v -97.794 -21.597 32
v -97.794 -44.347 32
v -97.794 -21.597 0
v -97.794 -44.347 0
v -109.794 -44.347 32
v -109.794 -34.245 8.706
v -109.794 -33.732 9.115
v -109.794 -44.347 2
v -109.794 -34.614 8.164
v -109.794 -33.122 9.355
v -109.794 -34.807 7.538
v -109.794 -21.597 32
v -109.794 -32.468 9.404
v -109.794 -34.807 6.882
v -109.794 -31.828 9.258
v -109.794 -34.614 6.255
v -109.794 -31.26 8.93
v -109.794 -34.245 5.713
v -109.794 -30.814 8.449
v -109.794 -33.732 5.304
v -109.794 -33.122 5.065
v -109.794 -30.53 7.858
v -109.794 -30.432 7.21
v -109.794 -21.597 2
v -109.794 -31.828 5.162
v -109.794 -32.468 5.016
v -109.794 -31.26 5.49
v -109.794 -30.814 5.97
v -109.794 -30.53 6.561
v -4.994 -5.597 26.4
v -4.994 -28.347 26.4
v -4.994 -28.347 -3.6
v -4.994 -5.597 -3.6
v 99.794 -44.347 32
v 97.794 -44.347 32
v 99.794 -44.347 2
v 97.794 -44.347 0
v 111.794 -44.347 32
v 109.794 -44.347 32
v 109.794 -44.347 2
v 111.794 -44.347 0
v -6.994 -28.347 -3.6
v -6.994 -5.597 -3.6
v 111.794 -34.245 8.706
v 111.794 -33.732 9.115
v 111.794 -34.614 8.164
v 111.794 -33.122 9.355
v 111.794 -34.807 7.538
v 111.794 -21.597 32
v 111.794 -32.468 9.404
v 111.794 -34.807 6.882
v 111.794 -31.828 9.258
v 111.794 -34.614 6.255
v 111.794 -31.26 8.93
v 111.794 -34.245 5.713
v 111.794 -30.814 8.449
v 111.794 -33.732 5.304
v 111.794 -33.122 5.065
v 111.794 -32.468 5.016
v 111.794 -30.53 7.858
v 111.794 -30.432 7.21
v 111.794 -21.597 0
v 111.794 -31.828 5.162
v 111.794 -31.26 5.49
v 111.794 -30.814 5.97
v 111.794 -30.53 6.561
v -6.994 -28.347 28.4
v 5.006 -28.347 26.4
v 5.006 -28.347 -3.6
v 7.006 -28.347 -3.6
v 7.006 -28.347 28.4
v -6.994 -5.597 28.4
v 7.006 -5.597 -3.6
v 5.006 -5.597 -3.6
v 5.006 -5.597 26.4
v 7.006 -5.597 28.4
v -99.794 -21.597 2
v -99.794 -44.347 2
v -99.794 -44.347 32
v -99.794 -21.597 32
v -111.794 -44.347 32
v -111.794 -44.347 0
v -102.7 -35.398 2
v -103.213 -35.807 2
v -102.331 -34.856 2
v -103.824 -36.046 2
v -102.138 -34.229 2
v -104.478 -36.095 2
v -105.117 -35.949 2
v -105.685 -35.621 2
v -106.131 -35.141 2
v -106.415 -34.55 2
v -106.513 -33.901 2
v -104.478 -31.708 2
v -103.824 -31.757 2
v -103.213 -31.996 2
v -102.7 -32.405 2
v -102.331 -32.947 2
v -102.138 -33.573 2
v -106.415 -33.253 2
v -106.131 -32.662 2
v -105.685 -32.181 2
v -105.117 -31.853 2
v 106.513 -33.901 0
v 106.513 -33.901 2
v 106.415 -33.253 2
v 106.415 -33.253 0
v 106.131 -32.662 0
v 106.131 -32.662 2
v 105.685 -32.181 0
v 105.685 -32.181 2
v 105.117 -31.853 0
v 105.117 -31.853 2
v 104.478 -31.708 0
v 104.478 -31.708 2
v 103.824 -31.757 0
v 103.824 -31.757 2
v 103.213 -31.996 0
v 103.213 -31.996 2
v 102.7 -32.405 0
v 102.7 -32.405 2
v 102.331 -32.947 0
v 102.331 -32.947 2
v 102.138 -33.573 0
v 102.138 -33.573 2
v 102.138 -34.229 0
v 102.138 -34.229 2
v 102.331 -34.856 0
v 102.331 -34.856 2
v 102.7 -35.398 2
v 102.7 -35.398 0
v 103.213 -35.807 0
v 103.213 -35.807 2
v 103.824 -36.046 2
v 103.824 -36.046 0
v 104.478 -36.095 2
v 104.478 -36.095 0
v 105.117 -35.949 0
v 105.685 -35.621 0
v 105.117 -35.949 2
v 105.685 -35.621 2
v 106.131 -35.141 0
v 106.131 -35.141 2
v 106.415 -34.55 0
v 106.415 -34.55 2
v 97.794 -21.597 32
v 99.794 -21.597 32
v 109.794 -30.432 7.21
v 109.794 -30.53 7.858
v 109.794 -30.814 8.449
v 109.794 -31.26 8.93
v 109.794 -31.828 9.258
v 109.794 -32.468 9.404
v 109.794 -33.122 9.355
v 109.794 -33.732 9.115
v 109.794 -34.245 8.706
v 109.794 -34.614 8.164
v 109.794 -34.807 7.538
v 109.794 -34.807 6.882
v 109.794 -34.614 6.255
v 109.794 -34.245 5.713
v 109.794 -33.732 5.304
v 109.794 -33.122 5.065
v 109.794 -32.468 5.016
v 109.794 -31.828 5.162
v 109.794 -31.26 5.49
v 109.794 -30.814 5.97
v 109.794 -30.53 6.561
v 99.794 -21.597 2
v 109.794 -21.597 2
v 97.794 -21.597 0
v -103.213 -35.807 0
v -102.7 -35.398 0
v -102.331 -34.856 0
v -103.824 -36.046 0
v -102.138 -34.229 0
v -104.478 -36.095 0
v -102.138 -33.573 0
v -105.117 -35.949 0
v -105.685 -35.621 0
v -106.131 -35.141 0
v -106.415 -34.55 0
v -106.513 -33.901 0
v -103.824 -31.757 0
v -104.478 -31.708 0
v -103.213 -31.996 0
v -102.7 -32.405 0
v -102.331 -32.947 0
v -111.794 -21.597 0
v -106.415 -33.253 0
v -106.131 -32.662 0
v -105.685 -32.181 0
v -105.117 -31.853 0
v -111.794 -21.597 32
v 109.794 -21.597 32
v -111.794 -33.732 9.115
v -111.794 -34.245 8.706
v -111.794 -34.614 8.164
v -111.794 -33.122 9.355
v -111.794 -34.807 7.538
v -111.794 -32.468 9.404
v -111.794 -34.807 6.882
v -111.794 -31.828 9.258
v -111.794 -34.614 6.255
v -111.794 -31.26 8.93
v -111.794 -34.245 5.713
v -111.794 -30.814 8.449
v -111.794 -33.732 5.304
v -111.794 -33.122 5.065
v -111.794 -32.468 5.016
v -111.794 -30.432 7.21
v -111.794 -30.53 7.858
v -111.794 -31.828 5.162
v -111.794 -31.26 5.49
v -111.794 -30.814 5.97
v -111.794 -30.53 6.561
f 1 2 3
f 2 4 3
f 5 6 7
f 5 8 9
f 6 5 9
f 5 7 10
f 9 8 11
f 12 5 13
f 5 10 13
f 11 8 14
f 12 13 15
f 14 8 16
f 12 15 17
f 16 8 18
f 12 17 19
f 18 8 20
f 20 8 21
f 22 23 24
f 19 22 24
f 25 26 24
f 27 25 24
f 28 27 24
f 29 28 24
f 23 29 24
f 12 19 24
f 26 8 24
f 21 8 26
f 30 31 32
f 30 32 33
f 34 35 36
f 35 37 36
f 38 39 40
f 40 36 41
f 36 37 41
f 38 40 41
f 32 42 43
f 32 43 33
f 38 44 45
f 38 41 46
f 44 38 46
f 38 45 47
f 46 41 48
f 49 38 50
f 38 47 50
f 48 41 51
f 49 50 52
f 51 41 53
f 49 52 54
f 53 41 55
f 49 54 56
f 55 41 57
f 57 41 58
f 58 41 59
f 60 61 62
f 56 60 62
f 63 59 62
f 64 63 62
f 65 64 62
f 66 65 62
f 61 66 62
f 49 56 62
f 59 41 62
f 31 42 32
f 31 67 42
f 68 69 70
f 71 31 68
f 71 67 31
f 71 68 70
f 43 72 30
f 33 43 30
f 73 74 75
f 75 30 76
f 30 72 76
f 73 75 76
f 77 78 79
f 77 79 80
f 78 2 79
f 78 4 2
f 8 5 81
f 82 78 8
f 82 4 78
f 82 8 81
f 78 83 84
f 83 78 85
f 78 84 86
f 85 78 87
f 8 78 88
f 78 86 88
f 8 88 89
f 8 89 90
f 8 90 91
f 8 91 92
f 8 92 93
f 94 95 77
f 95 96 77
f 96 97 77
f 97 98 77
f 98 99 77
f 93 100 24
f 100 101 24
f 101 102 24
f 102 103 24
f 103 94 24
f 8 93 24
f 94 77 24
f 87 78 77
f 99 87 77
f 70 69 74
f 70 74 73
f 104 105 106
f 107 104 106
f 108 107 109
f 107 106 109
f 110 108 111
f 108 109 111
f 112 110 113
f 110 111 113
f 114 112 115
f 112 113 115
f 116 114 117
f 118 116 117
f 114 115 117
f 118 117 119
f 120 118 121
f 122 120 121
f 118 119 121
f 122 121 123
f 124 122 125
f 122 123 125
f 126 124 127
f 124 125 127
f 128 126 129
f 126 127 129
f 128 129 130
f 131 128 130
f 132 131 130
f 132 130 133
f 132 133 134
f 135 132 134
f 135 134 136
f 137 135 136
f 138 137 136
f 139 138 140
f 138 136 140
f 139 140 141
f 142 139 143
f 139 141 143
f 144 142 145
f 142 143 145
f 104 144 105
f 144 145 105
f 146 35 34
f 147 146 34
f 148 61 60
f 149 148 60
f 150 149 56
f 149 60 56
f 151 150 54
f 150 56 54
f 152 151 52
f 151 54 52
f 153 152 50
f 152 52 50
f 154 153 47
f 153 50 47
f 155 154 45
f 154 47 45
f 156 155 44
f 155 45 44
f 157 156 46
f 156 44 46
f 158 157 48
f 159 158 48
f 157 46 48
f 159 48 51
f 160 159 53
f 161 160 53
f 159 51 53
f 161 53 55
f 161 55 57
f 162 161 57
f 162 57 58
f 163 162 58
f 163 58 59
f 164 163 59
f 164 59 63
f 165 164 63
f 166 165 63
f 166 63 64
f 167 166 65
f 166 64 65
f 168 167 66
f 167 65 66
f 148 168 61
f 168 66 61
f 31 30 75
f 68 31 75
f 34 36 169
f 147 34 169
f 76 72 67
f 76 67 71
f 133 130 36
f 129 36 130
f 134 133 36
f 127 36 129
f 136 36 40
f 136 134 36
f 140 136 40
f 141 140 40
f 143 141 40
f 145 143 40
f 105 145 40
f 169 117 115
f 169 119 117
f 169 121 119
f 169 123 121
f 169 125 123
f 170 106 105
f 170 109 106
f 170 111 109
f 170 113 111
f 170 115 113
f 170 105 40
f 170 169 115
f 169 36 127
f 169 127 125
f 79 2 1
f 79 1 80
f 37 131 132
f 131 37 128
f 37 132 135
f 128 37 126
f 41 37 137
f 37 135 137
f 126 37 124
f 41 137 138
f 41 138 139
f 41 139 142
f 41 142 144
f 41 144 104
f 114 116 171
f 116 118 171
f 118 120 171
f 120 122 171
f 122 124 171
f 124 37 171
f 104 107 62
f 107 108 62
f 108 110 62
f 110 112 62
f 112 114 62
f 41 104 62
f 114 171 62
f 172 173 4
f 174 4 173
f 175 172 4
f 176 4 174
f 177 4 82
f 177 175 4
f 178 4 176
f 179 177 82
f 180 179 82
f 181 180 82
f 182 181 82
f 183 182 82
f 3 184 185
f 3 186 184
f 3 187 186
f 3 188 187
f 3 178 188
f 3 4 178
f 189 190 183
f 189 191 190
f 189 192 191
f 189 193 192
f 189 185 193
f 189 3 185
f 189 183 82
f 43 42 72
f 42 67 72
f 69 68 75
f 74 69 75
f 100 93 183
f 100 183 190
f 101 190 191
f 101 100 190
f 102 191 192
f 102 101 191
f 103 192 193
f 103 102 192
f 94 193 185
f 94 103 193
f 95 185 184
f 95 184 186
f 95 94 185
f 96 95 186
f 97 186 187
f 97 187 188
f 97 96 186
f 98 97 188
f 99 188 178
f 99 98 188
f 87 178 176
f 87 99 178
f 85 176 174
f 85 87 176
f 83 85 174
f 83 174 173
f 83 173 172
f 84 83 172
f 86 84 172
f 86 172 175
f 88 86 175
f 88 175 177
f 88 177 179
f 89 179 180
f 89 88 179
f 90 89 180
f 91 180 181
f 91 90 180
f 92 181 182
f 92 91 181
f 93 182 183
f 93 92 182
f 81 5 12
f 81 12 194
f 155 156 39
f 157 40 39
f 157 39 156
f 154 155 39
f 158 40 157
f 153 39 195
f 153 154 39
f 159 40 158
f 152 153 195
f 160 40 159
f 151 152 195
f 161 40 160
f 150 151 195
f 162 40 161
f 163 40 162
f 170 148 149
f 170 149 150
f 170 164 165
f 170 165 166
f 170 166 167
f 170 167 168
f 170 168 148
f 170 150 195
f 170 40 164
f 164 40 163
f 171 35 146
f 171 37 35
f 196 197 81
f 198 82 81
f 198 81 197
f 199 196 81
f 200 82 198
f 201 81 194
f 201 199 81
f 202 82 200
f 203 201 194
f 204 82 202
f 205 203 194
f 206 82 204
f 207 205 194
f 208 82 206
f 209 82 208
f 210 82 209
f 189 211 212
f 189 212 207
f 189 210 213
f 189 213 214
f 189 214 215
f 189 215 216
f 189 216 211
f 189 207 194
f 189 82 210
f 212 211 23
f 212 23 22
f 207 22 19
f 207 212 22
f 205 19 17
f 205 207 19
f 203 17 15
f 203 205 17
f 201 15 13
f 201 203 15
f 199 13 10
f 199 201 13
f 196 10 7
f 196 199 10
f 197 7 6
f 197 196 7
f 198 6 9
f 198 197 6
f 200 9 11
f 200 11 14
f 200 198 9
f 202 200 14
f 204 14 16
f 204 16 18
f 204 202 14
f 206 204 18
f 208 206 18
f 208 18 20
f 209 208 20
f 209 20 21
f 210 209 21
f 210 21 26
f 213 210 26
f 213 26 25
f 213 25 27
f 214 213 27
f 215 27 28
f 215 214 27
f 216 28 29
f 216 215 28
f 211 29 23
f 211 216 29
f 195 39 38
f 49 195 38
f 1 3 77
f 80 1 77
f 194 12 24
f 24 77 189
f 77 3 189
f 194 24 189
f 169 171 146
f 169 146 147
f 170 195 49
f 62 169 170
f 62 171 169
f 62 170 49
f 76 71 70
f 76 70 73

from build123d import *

# Parameters (mm, degrees)
F1_W      = 14
F1_H      = 22.75
F2_DEPTH  = 2
F3_W      = 2
F3_H      = 22.75
F4_DEPTH  = 30
F5_R      = 2.2
F6_DEPTH  = 2
F7_R      = 2.2
F8_DEPTH  = 2
F10_ANGLE = 180
F13_W     = 7.1573019959
F13_H     = 10.3748198599
F14_DEPTH = 2
F16_W     = 18.6804127879
F16_H     = 9.1584324837
F17_DEPTH = 2


with BuildPart() as f2:
    # F1 (on Top) → F2 (new body)
    with BuildSketch(Plane.XY):
        with Locations((104.7940782905, -32.9721670151)):
            Rectangle(F1_W, F1_H)
    extrude(amount=F2_DEPTH)

    # F3 (on face) → F4 (join)
    with BuildSketch(Plane.XY.offset(2)):
        with Locations((98.7940782905, -32.9721670151)):
            Rectangle(F3_W, F3_H)
        with Locations((110.7940782905, -32.9721670151)):
            Rectangle(F3_W, F3_H)
    extrude(amount=F4_DEPTH)

    # F5 (on face) → F6 (cut, through all)
    with BuildSketch(Plane.YZ.offset(111.7940782905)):
        with Locations((-32.6319672167, 7.209660951)):
            Circle(F5_R)
    extrude(amount=-F6_DEPTH, mode=Mode.SUBTRACT)

    # F7 (on face) → F8 (cut, through all)
    with BuildSketch(Plane.XY.offset(2)):
        with Locations((104.3131947517, -33.9013487101)):
            Circle(F7_R)
    extrude(amount=-F8_DEPTH, mode=Mode.SUBTRACT)


with BuildPart() as f9_1:
    # F9: instance of F2
    add(f2.part.mirror(Plane.YZ))


with BuildPart() as f10_1:
    # F10: copy of F9_1
    add(f9_1.part.rotate(Axis((-97.7940782905, -32.9721670151, 0), (0, 1, 0)), F10_ANGLE))


with BuildPart() as f10_1_1:
    # F11: moved
    add(f10_1.part.moved(Location((90.8, 16, 28.4))))

    # F13 (on offset) → F14 (join, through all)
    with BuildSketch(Plane.XY.offset(28.4)):
        with Locations((-0.1049609855, -17.7491279319)):
            Rectangle(F13_W, F13_H)
    extrude(amount=-F14_DEPTH)

    # F16 (on offset) → F17 (join, through all)
    with BuildSketch(Plane.YZ.offset(7.0059217095)):
        with Locations((-16.3181161042, 20.9184978157)):
            Rectangle(F16_W, F16_H)
    extrude(amount=-F17_DEPTH)


solid = Compound([f2.part, f9_1.part, f10_1_1.part])
